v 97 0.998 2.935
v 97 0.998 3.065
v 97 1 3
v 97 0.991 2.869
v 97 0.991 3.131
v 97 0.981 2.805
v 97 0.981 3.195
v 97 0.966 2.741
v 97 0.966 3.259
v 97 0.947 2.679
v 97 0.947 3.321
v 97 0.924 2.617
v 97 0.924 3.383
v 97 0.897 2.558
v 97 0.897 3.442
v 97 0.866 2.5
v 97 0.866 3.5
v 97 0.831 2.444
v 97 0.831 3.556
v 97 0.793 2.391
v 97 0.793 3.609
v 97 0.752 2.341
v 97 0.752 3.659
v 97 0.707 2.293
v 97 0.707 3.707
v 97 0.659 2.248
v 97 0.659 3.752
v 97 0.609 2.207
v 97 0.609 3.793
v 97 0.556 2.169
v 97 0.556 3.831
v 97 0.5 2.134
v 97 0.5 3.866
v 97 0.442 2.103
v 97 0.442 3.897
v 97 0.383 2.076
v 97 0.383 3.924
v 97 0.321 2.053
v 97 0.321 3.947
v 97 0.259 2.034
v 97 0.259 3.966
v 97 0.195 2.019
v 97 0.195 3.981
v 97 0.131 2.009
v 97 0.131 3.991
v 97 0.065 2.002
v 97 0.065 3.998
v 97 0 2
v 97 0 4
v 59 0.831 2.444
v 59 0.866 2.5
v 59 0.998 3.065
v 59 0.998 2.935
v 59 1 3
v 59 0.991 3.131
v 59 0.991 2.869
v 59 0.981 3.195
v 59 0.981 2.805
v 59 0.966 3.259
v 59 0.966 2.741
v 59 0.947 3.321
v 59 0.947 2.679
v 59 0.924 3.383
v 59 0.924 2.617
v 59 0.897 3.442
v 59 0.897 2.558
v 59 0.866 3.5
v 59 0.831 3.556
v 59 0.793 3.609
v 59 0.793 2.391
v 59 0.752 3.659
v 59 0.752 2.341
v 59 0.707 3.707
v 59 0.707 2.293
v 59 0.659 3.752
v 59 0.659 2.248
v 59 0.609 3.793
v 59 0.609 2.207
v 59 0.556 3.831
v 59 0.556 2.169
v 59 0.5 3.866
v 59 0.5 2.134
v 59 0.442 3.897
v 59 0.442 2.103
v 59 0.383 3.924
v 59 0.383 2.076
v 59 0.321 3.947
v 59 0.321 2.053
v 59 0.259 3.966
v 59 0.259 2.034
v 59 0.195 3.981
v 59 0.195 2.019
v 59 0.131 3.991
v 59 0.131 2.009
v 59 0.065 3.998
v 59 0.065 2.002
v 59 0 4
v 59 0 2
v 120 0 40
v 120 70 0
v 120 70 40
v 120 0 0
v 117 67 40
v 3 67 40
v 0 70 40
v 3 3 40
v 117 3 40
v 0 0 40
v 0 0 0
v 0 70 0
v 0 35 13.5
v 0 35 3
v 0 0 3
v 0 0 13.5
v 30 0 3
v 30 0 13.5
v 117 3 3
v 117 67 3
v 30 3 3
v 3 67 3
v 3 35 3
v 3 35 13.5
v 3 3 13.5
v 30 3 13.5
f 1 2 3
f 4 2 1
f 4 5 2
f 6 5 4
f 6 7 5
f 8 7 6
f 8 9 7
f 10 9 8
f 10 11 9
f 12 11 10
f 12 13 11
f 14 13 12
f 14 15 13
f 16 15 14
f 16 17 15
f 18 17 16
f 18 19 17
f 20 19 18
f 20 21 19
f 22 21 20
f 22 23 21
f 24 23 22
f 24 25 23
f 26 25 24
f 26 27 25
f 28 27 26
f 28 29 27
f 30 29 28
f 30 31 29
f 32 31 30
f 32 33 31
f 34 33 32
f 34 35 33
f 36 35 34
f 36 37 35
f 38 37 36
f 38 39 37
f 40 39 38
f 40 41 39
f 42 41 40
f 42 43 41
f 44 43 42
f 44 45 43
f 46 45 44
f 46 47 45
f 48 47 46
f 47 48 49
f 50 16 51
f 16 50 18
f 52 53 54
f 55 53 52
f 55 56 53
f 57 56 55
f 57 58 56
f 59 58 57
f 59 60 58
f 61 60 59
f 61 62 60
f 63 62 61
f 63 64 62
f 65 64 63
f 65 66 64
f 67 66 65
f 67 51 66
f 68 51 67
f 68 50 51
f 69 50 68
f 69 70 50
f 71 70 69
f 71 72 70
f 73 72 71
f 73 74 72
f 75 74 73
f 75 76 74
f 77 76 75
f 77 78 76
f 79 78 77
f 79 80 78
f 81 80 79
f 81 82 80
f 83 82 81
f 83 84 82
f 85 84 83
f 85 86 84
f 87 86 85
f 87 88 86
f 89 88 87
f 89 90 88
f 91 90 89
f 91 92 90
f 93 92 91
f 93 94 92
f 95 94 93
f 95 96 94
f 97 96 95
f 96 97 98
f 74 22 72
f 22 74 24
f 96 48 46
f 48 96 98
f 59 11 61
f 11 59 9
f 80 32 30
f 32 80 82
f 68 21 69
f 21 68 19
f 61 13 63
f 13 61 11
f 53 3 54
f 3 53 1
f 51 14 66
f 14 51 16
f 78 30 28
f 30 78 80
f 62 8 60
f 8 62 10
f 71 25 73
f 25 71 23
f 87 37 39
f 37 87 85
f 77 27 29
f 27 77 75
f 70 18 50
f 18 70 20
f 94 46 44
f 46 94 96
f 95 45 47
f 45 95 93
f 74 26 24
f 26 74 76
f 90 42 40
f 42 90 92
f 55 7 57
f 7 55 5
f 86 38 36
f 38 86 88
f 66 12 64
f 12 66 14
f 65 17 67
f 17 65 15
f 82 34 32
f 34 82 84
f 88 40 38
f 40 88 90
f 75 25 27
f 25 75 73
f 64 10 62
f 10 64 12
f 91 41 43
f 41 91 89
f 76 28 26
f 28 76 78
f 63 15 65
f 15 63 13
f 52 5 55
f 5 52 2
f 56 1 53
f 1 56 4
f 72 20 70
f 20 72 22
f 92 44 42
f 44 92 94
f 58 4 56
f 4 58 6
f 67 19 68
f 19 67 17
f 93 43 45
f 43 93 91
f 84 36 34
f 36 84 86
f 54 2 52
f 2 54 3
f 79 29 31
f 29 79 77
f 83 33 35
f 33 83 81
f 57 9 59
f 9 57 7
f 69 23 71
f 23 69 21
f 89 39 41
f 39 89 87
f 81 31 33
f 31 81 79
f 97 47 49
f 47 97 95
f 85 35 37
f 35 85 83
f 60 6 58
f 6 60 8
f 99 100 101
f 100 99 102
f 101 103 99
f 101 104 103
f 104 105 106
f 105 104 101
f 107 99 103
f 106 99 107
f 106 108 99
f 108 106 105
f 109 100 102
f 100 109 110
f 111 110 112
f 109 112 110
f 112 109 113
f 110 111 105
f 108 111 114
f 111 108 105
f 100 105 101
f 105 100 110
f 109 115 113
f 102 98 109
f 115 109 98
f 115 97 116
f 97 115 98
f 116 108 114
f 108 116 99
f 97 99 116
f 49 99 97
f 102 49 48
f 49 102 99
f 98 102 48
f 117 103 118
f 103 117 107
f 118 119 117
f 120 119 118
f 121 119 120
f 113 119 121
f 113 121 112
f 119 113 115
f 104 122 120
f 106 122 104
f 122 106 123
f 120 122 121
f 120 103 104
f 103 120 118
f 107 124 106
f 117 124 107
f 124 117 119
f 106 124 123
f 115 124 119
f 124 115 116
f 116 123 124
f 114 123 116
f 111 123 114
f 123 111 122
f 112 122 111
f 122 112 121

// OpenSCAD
// Buffer tank for mini horizontal gel-electrophoresis box
// Units: mm. Tank rests on XY plane at z = 0, builds upward (+Z).

$fn = 96;

// ---- Tank ----
tank_x      = 120;   // outer length (X)
tank_y      = 70;    // outer width (Y)
tank_h      = 40;    // outer height (Z)
wall        = 3;     // wall thickness
floor_t     = 3;     // floor thickness

// ---- Gel-tray platform ----
plat_x      = 60;    // platform length in X (centred)
plat_top_z  = 13;    // platform top height above inner floor (z = 13)

// ---- Electrode holes ----
hole_d      = 2;     // electrode hole diameter
hole_y      = 0;     // electrode hole Y position
hole_w_z    = tank_h - floor_t; // hole length along Z (through end wall)

// ---- Misc ----
eps         = 0.5;   // cutter overshoot past faces

// ---- Model ----
difference() {
    // Outer tank shell
    cube([tank_x, tank_y, tank_h]);

    // Inner cavity, from top of floor to tank top (open top)
    translate([wall, wall, floor_t])
        cube([tank_x - 2 * wall, tank_y - 2 * wall, tank_h - floor_t + eps]);

    // Raised platform in middle of tank
    translate([-plat_x / 2, -tank_y / 2, floor_t])
        cube([plat_x, tank_y, plat_top_z - floor_t + eps]);

    // Horizontal electrode holes through each end wall (along X)
    for (side = [-1, 1])
        translate([side * (tank_x / 2 - hole_d / 2), hole_y, floor_t])
            rotate([0, 90, 0])
                cylinder(d = hole_d, h = hole_w_z + 2 * eps);
}
